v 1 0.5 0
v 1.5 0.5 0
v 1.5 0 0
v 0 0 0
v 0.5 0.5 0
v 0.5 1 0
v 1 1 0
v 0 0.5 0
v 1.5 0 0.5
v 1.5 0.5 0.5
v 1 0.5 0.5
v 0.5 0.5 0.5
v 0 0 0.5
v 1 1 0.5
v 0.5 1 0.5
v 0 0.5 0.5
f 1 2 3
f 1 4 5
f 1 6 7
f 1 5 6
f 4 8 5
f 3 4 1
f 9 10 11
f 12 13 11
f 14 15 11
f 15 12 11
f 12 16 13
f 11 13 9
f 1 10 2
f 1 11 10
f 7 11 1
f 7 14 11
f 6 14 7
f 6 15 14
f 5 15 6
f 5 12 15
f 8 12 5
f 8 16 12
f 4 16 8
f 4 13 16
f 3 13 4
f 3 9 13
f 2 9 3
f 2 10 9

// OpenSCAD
// Tetromino (T) for Stacks of Shapes
// by Slashee the Cow
linear_extrude(0.5)
polygon([[0,0],[1.5,0],[1.5,0.5],[1,0.5],[1,1],[0.5,1],[0.5,0.5],[0,0.5]]);
